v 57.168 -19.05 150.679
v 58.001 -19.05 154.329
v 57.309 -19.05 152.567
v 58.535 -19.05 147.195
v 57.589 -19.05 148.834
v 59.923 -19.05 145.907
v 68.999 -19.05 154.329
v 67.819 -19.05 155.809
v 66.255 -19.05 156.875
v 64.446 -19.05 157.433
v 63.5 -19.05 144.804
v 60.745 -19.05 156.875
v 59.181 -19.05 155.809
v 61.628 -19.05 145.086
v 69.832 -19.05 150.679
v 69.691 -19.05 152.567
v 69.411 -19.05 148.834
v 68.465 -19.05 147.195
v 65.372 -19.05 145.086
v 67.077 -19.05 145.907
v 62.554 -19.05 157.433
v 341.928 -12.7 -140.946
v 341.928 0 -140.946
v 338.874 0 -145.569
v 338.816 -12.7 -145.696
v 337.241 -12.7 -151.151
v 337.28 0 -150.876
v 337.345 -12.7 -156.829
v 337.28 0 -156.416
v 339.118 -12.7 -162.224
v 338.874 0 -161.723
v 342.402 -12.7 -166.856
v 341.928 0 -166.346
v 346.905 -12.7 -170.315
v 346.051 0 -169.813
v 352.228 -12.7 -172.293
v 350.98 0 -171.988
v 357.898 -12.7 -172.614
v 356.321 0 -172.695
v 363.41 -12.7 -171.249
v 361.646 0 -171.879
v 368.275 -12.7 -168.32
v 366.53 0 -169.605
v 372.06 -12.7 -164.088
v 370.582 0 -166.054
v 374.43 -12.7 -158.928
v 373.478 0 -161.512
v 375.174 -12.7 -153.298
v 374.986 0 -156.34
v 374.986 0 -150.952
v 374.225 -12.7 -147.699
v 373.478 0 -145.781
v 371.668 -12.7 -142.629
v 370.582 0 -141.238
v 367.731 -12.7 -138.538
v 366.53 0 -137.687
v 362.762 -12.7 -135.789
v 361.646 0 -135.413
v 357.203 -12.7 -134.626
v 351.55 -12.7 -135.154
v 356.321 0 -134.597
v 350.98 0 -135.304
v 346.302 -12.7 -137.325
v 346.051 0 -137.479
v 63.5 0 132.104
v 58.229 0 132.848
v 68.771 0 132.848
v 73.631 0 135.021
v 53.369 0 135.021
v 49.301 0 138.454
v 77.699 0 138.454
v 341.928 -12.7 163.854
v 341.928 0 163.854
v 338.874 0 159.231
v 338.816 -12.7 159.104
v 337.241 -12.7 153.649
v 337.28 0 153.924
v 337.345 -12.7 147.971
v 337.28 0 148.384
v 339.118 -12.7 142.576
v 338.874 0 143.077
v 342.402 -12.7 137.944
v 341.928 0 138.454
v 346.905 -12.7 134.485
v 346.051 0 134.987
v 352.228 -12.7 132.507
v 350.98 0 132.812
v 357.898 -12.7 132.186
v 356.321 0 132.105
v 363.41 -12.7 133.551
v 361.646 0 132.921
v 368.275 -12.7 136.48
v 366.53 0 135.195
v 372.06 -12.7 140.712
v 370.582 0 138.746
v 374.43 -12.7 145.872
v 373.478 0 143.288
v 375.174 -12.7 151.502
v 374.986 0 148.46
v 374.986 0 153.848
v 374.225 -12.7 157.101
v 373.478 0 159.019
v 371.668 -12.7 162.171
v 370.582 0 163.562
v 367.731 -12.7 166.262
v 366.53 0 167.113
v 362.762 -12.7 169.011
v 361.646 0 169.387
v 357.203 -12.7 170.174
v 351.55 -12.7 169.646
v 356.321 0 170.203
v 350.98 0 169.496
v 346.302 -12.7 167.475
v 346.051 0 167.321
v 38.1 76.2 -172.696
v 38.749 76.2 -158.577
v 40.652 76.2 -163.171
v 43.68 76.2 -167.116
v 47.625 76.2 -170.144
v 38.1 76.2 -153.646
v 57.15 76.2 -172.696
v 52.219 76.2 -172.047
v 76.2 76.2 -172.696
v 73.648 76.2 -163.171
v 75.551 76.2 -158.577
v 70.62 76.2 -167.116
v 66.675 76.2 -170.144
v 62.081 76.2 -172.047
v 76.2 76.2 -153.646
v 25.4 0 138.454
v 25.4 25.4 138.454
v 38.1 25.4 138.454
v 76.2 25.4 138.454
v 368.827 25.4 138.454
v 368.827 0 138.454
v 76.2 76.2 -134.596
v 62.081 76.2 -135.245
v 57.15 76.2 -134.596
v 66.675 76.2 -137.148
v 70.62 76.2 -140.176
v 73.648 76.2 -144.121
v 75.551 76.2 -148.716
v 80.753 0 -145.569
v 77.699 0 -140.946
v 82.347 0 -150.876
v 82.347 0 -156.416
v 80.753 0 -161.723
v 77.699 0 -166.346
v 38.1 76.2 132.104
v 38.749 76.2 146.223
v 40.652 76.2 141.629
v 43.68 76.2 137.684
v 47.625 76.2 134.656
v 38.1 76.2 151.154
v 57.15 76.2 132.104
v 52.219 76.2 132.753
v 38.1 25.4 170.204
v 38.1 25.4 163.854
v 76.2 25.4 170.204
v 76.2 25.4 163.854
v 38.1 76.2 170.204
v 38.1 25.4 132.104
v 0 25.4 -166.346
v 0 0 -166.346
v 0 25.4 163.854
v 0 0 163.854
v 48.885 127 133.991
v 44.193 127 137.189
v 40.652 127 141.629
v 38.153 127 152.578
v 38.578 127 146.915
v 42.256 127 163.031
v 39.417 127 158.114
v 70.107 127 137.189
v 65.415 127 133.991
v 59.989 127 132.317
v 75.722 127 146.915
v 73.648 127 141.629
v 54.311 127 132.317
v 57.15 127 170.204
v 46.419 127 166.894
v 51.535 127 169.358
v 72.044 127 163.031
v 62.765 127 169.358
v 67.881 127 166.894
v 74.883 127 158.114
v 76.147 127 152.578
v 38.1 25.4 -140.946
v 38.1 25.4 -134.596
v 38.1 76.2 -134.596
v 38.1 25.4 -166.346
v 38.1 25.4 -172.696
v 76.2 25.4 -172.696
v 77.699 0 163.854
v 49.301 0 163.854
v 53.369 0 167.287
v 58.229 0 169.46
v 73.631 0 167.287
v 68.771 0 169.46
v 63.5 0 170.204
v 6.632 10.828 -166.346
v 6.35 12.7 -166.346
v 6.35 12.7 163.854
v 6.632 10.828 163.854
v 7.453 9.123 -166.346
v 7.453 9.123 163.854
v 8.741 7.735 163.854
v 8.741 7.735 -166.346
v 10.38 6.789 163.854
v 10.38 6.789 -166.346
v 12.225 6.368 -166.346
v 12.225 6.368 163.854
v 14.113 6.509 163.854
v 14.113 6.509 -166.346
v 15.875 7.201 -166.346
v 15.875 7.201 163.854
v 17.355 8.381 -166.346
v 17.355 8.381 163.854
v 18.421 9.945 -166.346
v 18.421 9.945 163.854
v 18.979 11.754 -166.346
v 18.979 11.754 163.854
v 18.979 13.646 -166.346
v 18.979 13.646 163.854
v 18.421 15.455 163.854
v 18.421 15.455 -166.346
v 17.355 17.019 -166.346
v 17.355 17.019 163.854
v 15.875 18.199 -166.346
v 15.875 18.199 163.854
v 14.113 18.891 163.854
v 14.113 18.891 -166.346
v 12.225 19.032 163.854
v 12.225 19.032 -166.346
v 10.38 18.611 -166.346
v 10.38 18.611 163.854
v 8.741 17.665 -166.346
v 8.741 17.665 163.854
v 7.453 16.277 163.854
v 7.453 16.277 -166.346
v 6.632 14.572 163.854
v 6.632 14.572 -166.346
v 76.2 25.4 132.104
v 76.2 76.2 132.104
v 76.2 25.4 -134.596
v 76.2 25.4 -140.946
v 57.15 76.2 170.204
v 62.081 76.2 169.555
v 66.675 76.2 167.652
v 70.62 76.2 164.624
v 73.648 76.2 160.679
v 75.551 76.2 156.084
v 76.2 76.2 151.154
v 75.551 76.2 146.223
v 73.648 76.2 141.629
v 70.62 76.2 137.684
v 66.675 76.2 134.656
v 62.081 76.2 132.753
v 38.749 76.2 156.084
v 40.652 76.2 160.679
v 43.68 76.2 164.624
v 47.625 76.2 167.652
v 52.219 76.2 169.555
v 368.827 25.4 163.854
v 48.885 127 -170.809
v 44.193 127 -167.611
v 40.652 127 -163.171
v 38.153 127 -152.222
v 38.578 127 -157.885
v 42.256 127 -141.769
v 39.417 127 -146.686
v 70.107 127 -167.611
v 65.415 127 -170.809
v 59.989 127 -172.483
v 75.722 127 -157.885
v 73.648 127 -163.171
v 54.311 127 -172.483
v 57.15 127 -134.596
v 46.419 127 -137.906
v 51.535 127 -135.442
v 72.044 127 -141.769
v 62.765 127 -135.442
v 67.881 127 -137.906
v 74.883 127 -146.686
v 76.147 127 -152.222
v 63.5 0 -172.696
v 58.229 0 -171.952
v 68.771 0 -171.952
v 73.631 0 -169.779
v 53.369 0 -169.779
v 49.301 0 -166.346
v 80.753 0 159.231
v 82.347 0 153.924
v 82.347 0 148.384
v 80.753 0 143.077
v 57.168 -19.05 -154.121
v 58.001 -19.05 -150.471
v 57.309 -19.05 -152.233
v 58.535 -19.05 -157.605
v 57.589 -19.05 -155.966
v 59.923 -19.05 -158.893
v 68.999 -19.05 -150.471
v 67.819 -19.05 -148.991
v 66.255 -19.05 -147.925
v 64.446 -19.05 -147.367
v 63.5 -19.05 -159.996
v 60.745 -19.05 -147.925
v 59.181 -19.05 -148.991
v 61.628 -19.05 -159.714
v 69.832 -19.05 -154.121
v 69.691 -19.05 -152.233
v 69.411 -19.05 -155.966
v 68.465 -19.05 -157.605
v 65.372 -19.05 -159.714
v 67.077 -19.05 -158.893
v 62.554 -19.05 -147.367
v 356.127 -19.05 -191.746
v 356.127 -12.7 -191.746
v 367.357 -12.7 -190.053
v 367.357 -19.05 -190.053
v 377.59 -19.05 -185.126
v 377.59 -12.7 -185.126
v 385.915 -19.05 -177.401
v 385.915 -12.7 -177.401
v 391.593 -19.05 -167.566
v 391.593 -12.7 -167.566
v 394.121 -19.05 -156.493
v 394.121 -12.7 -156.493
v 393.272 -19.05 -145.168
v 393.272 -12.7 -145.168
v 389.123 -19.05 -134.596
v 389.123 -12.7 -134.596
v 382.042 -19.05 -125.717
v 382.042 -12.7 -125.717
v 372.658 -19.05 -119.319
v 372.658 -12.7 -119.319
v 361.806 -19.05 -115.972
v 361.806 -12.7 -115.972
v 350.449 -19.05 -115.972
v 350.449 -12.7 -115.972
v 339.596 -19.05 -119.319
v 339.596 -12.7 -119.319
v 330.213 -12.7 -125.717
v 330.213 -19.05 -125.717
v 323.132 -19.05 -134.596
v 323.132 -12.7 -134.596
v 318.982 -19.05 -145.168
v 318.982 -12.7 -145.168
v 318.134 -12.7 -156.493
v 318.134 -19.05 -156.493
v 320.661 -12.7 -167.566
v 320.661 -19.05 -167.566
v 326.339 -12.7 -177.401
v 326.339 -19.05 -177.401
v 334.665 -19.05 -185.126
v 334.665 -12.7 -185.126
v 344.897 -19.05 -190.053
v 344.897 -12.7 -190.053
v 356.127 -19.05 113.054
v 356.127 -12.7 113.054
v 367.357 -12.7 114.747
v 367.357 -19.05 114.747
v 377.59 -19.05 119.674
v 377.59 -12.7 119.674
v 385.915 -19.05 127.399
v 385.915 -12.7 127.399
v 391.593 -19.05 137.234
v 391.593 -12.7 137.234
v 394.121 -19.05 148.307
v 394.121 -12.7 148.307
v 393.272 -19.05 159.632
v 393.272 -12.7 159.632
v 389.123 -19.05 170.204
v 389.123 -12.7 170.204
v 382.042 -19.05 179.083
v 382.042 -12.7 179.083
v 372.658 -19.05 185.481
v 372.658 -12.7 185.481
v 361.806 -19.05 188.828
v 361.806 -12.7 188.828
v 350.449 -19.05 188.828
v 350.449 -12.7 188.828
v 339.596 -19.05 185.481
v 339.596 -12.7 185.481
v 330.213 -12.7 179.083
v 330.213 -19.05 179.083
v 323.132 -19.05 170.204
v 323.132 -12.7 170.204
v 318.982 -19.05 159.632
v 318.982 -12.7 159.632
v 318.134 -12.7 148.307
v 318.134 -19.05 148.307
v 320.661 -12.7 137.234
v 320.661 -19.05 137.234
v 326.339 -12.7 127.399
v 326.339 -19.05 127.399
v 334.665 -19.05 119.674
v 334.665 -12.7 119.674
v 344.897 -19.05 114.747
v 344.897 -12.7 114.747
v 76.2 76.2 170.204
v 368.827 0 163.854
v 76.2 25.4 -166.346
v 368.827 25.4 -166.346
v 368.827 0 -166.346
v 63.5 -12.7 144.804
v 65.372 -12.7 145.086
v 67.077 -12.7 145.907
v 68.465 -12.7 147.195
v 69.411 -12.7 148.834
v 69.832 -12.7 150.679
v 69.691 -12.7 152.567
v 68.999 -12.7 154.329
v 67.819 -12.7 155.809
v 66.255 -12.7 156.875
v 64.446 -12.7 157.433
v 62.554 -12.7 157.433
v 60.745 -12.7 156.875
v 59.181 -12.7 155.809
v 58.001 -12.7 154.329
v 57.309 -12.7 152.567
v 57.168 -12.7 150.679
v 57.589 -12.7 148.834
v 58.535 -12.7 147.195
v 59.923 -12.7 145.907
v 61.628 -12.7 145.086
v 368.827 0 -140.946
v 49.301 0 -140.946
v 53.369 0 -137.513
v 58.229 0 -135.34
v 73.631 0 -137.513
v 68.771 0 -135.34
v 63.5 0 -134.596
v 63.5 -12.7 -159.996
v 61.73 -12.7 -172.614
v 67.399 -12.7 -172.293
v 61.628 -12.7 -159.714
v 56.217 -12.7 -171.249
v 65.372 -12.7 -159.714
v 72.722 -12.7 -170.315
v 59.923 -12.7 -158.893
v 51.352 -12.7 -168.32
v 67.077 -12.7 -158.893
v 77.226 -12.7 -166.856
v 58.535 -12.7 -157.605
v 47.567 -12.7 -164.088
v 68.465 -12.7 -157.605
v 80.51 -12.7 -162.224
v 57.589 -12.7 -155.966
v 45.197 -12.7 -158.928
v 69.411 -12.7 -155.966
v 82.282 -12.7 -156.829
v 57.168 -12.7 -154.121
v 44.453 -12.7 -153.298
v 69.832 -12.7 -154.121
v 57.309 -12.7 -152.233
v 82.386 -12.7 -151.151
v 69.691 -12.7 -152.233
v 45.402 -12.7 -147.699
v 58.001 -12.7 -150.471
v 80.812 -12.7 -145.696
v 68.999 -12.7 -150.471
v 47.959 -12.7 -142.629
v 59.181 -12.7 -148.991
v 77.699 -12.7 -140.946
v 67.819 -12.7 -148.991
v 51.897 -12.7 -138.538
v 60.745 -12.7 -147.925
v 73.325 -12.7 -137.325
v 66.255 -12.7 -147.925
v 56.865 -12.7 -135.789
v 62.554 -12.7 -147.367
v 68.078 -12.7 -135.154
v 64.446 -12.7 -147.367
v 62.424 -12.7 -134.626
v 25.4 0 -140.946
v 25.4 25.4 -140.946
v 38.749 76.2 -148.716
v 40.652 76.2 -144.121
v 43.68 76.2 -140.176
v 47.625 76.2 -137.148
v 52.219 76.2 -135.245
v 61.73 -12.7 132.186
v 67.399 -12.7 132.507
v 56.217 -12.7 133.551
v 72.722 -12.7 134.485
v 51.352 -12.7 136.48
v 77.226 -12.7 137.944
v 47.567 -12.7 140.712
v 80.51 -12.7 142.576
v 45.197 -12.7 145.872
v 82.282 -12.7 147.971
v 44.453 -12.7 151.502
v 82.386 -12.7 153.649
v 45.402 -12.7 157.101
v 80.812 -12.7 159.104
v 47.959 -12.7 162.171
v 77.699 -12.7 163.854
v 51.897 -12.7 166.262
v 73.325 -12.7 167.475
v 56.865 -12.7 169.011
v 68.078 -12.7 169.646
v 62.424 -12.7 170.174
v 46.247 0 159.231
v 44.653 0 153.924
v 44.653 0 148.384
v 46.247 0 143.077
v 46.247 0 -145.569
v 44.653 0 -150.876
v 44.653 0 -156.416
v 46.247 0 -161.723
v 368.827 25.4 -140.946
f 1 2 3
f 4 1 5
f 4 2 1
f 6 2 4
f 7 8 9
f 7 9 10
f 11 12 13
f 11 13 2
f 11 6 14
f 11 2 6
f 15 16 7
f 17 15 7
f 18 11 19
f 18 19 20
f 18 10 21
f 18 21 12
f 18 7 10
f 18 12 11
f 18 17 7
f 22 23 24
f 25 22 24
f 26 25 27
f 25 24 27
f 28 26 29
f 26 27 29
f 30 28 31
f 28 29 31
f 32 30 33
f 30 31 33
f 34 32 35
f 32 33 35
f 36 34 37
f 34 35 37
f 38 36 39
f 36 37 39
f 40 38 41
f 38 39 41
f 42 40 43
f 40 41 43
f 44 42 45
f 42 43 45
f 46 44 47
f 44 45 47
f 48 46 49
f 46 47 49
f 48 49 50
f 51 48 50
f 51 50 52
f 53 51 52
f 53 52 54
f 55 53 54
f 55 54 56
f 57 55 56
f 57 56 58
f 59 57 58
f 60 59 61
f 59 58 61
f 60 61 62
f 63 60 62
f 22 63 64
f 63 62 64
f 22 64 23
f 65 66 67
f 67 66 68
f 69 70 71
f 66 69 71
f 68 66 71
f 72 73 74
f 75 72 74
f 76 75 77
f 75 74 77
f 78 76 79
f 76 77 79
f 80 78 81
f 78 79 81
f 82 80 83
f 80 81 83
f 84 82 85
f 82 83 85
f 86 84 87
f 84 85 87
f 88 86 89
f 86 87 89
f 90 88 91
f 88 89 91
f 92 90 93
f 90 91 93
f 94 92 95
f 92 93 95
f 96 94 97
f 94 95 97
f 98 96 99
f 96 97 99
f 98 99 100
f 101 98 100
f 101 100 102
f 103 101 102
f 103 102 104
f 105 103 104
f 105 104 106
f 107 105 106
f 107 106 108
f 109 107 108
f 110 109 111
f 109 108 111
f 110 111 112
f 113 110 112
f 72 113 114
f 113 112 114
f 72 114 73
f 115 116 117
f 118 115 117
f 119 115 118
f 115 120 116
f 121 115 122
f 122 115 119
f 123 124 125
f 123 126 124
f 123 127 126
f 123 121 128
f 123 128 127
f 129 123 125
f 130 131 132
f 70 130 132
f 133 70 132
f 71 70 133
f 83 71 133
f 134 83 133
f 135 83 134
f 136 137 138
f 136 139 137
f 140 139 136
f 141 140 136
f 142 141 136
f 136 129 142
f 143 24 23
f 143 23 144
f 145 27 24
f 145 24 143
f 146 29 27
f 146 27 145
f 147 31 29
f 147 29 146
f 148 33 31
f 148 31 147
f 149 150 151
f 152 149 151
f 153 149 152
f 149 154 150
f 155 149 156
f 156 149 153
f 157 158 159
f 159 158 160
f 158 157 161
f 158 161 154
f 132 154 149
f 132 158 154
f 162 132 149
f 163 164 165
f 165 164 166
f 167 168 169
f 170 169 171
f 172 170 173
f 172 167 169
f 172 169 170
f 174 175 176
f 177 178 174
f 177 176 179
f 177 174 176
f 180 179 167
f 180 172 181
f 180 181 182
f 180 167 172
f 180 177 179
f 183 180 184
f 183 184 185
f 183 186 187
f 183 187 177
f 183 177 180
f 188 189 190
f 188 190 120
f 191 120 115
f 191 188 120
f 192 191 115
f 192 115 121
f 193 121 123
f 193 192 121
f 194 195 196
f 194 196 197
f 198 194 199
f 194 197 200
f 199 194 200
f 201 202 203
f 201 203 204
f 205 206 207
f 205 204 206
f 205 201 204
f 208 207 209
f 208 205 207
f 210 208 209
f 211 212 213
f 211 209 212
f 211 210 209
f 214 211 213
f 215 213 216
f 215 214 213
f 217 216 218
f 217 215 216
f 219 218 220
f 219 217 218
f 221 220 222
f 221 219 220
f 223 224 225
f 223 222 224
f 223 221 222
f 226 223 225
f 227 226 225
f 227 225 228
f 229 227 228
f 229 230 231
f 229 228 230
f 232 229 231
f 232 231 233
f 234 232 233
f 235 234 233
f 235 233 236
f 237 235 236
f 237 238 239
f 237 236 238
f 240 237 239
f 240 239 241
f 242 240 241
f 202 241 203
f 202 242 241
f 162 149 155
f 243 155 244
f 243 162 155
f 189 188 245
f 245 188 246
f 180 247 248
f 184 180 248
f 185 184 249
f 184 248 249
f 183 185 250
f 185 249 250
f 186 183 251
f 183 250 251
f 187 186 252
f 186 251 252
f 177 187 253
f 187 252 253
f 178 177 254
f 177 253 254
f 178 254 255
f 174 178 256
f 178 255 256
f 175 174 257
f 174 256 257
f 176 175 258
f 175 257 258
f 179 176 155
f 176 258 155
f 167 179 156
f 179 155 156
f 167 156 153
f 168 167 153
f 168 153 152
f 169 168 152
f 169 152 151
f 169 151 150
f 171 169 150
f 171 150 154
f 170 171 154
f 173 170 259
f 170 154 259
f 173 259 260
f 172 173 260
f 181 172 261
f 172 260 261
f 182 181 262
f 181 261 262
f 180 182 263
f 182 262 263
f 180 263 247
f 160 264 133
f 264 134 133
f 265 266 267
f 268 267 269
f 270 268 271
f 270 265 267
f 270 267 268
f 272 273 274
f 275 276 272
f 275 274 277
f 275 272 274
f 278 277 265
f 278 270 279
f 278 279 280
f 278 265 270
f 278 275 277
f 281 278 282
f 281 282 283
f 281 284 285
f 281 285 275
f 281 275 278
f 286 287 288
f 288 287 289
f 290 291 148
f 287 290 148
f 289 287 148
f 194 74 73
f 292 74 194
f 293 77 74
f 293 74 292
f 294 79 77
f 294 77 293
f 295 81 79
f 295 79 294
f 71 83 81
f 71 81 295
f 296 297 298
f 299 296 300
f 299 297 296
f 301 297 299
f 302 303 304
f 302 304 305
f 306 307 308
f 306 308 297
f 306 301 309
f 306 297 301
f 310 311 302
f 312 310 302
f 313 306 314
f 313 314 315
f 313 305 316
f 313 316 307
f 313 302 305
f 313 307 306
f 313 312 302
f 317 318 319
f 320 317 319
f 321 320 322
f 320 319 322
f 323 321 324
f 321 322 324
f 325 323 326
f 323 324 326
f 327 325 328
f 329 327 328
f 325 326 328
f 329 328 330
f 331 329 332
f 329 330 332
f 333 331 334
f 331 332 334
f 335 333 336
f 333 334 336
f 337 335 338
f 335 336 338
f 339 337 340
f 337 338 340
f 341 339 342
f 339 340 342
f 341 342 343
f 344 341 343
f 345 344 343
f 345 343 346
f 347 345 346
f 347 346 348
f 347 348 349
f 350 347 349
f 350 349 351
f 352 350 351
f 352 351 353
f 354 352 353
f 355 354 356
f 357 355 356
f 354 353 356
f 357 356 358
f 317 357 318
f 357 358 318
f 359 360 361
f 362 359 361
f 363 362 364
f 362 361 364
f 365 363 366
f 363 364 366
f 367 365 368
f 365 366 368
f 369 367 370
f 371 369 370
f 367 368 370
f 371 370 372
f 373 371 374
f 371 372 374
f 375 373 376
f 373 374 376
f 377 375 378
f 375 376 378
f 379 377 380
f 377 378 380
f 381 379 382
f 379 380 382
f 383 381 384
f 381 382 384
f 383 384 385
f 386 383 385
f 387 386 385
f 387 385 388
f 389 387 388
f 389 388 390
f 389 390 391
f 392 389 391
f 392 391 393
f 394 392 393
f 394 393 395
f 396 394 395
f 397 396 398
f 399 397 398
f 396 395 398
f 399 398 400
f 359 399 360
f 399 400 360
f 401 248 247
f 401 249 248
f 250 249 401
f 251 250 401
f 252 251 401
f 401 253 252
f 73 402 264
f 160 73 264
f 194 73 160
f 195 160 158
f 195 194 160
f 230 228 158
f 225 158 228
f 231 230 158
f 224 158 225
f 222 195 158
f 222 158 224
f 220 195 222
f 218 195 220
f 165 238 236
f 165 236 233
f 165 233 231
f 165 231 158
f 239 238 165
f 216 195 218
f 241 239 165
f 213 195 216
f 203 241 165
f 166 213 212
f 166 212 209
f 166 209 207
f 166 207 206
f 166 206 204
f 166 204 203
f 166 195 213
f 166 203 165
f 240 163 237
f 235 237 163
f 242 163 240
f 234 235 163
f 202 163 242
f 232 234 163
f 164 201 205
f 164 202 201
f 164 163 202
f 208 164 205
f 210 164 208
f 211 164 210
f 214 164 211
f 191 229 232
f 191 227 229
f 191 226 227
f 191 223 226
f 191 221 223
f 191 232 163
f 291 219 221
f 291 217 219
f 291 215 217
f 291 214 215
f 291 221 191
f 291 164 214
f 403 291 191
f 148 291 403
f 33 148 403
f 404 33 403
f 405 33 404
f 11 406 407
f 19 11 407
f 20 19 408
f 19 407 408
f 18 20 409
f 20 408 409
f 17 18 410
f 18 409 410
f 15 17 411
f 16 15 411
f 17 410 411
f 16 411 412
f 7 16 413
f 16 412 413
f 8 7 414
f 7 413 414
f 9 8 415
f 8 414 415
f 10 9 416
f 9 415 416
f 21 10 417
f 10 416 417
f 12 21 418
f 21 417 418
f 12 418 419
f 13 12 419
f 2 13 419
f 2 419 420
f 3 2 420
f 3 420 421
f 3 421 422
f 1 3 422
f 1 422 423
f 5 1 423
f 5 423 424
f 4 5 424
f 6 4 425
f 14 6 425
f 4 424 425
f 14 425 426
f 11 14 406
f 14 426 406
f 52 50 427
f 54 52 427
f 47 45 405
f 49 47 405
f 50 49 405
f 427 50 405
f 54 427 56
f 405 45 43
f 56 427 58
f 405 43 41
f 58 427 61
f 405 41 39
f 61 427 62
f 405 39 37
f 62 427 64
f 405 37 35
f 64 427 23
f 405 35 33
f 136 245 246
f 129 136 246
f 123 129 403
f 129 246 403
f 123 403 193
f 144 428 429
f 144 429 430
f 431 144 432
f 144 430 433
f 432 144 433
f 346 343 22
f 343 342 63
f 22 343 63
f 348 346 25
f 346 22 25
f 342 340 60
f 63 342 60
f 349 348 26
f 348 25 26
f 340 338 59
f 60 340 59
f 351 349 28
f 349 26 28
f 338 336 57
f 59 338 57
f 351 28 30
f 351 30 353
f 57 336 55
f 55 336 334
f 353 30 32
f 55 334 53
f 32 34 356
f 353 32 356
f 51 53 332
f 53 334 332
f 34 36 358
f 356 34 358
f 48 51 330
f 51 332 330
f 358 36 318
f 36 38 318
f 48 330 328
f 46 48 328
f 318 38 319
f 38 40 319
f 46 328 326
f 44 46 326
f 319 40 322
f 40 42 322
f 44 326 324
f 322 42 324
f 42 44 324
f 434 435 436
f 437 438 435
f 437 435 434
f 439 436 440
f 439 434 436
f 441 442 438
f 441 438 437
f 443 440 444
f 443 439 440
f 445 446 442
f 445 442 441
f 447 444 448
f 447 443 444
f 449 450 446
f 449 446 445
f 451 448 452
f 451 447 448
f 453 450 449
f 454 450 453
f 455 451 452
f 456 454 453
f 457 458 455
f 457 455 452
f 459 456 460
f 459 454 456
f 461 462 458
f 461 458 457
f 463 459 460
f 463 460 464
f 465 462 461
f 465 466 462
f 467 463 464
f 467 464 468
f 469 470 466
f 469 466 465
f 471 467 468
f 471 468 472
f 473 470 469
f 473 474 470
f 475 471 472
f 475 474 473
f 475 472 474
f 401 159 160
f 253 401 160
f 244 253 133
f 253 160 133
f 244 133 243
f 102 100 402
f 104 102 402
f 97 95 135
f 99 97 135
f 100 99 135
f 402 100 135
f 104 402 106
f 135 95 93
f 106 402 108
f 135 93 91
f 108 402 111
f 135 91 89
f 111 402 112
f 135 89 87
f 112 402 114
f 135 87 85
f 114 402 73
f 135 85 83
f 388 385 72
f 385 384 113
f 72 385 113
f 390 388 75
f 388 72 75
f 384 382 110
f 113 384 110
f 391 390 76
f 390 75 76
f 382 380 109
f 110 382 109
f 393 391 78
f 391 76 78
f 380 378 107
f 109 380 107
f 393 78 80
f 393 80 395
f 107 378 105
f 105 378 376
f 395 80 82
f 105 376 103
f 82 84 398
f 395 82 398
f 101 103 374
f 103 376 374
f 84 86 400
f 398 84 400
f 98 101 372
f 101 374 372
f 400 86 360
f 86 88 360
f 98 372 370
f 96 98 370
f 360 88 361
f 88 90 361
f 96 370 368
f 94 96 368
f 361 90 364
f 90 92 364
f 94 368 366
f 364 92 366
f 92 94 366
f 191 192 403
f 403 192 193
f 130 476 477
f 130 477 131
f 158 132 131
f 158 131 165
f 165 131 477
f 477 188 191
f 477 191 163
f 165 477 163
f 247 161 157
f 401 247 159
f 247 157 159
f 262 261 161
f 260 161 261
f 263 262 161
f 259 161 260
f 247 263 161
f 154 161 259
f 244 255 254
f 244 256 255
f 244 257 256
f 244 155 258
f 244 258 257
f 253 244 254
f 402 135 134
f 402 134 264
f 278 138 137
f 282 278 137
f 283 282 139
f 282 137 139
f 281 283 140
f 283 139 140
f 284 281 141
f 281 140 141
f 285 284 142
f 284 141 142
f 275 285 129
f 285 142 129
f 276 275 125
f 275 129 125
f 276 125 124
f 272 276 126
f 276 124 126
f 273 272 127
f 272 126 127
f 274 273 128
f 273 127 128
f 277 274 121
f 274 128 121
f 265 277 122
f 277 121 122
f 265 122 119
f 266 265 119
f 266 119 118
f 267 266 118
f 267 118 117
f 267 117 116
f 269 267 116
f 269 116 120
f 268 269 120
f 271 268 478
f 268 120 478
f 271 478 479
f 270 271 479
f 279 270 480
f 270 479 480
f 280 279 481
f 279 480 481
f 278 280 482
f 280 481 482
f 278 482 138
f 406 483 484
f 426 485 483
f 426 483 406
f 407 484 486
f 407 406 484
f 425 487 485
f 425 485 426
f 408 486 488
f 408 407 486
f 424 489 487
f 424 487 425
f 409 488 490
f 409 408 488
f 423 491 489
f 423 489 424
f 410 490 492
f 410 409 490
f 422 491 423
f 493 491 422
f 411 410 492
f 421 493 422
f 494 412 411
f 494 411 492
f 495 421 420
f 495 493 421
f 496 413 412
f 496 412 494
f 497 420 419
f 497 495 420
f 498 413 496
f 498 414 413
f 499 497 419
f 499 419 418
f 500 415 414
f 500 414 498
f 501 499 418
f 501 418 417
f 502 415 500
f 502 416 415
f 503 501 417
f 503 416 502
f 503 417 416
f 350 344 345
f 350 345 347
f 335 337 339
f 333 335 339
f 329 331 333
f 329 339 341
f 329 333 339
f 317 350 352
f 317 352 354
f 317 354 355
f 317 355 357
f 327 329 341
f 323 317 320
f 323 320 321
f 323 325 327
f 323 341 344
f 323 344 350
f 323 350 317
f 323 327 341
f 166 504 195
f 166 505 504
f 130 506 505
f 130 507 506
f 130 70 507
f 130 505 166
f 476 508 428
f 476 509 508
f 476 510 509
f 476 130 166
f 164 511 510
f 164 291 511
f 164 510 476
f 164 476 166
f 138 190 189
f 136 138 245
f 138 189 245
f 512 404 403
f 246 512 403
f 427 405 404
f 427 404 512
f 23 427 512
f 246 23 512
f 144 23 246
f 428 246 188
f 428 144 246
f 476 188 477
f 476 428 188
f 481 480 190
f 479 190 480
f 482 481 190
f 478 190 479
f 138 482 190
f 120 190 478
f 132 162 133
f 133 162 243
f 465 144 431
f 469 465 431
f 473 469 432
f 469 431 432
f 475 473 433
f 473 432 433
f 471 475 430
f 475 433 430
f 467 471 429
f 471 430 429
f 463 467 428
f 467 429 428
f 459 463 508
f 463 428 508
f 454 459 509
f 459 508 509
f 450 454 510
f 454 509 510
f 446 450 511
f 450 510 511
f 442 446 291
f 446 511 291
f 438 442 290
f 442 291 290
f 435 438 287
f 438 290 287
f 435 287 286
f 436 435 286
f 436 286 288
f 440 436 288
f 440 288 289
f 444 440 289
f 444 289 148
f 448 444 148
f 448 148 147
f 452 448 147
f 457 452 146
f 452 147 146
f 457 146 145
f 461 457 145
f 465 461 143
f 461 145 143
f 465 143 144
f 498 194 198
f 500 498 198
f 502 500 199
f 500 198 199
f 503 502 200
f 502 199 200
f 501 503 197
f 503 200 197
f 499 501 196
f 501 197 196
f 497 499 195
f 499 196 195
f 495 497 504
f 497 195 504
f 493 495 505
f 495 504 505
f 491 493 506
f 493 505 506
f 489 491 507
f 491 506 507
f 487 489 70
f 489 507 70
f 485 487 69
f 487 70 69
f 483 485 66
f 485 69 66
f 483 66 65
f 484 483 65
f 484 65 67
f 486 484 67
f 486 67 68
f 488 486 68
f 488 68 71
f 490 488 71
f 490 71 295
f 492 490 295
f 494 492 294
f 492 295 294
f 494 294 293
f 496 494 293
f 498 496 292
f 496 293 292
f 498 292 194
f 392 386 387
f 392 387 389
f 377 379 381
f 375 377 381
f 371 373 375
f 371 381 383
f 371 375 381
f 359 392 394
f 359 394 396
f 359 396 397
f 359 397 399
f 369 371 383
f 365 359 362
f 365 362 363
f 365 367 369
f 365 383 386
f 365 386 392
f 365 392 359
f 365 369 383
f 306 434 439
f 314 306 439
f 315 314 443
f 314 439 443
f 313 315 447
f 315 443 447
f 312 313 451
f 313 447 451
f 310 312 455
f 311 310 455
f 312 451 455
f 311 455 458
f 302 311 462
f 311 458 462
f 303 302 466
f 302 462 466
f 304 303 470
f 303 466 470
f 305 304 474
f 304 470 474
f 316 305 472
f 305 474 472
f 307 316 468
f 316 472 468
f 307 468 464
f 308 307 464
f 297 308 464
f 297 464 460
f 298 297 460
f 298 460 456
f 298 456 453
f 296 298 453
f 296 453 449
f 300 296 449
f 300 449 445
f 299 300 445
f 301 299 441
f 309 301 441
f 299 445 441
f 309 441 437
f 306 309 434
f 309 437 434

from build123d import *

# Parameters (mm, degrees)
BOSS_EXTRUDE1_DEPTH     = 25.4
SKETCH3_W               = 38.1
SKETCH3_H               = 38.1
BOSS_EXTRUDE2_DEPTH     = 50.8
SKETCH4_R               = 19.05
BOSS_EXTRUDE3_DEPTH     = 50.8
LPATTERN1_COUNT         = 2
LPATTERN1_PITCH         = 304.8
SKETCH5_R               = 19.05
BOSS_EXTRUDE4_DEPTH     = 12.7
SKETCH6_R               = 6.35
BOSS_EXTRUDE5_DEPTH     = 6.35
LPATTERN2_COUNT         = 2
LPATTERN2_PITCH         = 304.8
SKETCH7_R               = 19.05
BOSS_EXTRUDE6_DEPTH     = 12.7
SKETCH8_R               = 38.1
BOSS_EXTRUDE7_DEPTH     = 6.35
LPATTERN3_COUNT         = 2
LPATTERN3_PITCH         = 304.8
CUT_EXTRUDE1_DEPTH      = 546.889568885
CUT_EXTRUDE1_DEPTH_BACK = 546.889568885
SKETCH9_R               = 6.35


with BuildPart() as part:
    # Sketch1 → Boss-Extrude1 (new body)
    with BuildSketch(Plane(origin=(0, 0, 0), x_dir=(1, 0, 0), z_dir=(0, 1, 0))):
        Polygon((0, 0), (0, 166.346037736), (368.827169811, 166.346037736), (368.827169811, 140.946037736), (25.4, 140.946037736), (25.4, -138.453962264), (368.827169811, -138.453962264), (368.827169811, -163.853962264), (0, -163.853962264), align=None)
    extrude(amount=BOSS_EXTRUDE1_DEPTH)

    # Sketch3 → Boss-Extrude2 (add)
    with BuildSketch(Plane(origin=(0, 25.4, 0), x_dir=(1, 0, 0), z_dir=(0, 1, 0))):
        with Locations((57.15, -151.153962264)):
            Rectangle(SKETCH3_W, SKETCH3_H)
    boss_extrude2 = extrude(amount=BOSS_EXTRUDE2_DEPTH)

    # Sketch4 → Boss-Extrude3 (add)
    with BuildSketch(Plane(origin=(0, 76.2, 0), x_dir=(1, 0, 0), z_dir=(0, 1, 0))):
        with Locations(Location((57.15, -151.153962264, 0), (0, 0, 270))):
            Circle(SKETCH4_R)
    boss_extrude3 = extrude(amount=BOSS_EXTRUDE3_DEPTH)

    # LPattern1: Boss-Extrude2, Boss-Extrude3 ×2
    with Locations(*[(0, 0, -i * LPATTERN1_PITCH) for i in range(1, LPATTERN1_COUNT)]):
        add(boss_extrude2)
        add(boss_extrude3)

    # Sketch5 → Boss-Extrude4 (add)
    with BuildSketch(Plane.XZ):
        with Locations(Location((63.5, 151.153962264, 0), (0, 0, 41.810314896))):
            Circle(SKETCH5_R)
    boss_extrude4 = extrude(amount=BOSS_EXTRUDE4_DEPTH)

    # Sketch6 → Boss-Extrude5 (add)
    with BuildSketch(Plane.XZ.offset(12.7)):
        with Locations(Location((63.5, 151.153962264, 0), (0, 0, 270))):
            Circle(SKETCH6_R)
    boss_extrude5 = extrude(amount=BOSS_EXTRUDE5_DEPTH)

    # LPattern2: Boss-Extrude4, Boss-Extrude5 ×2
    with Locations(*[(0, 0, -i * LPATTERN2_PITCH) for i in range(1, LPATTERN2_COUNT)]):
        add(boss_extrude4)
        add(boss_extrude5)

    # Sketch7 → Boss-Extrude6 (add)
    with BuildSketch(Plane.XZ):
        with Locations(Location((356.127169811, 151.153962264, 0), (0, 0, 138.189685104))):
            Circle(SKETCH7_R)
    boss_extrude6 = extrude(amount=BOSS_EXTRUDE6_DEPTH)

    # Sketch8 → Boss-Extrude7 (add)
    with BuildSketch(Plane.XZ.offset(12.7)):
        with Locations(Location((356.127169811, 151.153962264, 0), (0, 0, 270))):
            Circle(SKETCH8_R)
    boss_extrude7 = extrude(amount=BOSS_EXTRUDE7_DEPTH)

    # LPattern3: Boss-Extrude6, Boss-Extrude7 ×2
    with Locations(*[(0, 0, -i * LPATTERN3_PITCH) for i in range(1, LPATTERN3_COUNT)]):
        add(boss_extrude6)
        add(boss_extrude7)

    # Sketch9 → Cut-Extrude1 (cut, two sides: drawn at the far end of the back side and taken through both)
    with BuildSketch(Plane.XY.offset(163.853962264).offset(-CUT_EXTRUDE1_DEPTH_BACK)):
        with Locations(Location((12.7, 12.7, 0), (0, 0, 180))):
            Circle(SKETCH9_R)
    extrude(amount=CUT_EXTRUDE1_DEPTH + CUT_EXTRUDE1_DEPTH_BACK, mode=Mode.SUBTRACT)


solid = part.part
